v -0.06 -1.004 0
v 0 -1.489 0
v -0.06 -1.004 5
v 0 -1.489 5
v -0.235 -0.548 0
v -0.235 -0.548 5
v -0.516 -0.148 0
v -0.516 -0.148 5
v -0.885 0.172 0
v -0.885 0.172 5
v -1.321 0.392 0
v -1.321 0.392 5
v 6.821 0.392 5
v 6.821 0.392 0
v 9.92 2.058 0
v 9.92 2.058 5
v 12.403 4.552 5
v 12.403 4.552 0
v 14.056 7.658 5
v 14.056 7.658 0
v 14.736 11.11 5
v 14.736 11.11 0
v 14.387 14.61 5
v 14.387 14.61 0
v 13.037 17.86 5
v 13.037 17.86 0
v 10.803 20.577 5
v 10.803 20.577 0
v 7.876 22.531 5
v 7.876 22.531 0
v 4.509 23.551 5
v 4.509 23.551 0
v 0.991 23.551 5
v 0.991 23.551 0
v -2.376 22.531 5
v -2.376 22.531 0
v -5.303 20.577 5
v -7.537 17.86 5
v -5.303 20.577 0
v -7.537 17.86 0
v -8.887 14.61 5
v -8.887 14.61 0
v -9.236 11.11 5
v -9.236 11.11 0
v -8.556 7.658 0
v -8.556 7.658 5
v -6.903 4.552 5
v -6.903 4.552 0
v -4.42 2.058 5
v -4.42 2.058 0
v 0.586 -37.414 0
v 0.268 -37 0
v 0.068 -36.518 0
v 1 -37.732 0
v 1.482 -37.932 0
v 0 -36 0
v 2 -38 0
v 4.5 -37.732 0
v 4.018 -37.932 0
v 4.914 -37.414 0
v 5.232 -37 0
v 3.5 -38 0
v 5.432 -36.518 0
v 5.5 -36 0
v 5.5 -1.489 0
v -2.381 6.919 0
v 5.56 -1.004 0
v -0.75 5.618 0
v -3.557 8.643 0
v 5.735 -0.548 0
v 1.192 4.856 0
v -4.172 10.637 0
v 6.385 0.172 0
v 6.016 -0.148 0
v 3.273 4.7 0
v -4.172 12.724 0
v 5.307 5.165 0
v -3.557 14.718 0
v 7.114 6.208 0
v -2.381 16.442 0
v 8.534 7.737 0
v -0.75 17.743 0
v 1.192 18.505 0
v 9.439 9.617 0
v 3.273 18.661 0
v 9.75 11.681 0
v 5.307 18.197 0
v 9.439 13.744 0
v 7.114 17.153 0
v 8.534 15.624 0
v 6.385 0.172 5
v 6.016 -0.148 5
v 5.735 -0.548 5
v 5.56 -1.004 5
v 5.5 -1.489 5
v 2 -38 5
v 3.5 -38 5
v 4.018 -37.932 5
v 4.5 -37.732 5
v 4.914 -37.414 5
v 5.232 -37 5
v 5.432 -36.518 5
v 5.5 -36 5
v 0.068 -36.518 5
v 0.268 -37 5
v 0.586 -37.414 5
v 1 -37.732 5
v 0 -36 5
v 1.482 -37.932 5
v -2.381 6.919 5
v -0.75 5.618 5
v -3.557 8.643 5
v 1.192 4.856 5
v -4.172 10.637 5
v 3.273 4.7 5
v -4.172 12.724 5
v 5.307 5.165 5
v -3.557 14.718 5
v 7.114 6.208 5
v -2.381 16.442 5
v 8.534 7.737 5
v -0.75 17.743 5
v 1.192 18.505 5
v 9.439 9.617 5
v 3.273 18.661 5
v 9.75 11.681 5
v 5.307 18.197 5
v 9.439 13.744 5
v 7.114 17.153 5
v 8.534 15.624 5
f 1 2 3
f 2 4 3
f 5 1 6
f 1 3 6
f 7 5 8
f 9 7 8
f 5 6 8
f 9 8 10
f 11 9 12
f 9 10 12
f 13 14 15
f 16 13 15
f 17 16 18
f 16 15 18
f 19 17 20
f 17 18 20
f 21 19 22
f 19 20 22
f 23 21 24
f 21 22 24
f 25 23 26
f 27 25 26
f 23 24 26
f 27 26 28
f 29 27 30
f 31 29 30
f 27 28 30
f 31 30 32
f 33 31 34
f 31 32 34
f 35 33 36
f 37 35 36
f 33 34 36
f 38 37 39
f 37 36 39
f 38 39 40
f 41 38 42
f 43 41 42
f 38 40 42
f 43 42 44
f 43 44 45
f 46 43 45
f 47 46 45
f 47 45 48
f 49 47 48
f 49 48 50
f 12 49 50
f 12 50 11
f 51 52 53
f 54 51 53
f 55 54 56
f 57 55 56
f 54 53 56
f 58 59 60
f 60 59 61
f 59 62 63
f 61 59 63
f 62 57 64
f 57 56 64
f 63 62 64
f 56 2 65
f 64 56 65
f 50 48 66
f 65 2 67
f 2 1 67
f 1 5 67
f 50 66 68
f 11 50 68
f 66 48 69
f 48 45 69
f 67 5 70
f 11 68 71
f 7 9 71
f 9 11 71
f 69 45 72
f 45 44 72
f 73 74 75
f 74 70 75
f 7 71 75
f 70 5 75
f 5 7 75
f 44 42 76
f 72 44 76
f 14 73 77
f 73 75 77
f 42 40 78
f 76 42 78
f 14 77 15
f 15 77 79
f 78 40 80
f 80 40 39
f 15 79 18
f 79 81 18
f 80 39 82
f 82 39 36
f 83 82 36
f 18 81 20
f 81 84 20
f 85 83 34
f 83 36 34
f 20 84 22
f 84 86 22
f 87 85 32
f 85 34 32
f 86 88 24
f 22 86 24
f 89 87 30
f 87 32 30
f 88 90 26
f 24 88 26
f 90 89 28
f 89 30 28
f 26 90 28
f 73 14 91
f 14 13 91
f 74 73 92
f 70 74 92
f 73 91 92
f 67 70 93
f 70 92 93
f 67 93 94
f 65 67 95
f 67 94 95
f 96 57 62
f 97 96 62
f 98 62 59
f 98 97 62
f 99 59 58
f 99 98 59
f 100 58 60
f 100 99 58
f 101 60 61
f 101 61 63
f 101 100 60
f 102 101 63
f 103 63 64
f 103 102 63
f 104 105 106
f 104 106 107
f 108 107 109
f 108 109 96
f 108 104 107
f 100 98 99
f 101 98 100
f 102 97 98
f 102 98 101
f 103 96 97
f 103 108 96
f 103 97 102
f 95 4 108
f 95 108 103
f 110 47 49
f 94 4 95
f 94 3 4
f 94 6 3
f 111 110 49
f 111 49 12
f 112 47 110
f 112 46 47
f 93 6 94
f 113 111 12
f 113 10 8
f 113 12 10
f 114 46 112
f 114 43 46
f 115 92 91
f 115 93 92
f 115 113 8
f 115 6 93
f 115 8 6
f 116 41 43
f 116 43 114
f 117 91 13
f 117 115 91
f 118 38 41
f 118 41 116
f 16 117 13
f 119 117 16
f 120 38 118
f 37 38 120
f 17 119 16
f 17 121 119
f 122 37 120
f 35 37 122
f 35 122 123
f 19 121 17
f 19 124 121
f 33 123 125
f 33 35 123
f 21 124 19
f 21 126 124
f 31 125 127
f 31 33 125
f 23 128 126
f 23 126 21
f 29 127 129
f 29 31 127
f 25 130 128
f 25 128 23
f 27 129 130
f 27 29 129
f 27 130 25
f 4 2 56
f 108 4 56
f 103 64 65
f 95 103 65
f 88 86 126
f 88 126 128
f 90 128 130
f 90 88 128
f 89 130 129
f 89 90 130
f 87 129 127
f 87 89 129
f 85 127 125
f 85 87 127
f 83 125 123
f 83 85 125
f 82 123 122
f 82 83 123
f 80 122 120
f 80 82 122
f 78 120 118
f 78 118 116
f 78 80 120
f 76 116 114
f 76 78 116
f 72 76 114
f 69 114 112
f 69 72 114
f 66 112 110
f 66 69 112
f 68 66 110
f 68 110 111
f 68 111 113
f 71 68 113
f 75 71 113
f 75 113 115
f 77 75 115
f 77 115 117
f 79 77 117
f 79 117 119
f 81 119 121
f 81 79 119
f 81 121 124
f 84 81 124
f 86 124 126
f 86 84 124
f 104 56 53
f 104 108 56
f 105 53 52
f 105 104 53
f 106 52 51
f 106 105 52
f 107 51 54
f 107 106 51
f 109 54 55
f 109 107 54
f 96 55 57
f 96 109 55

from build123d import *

# Parameters (mm, degrees)
SKETCH1_R           = 7
BOSS_EXTRUDE1_DEPTH = 5
FILLET1_R           = 2


with BuildPart() as part:
    # Sketch1 → Boss-Extrude1 (new body)
    with BuildSketch(Plane.XY):
        with BuildLine():
            Line((0, 0), (0, -38))
            Line((0, -38), (5.5, -38))
            Line((5.5, -38), (5.5, 0))
            ThreePointArc((5.5, 0), (2.75, 23.680646386), (0, 0))
        make_face()
        with Locations((2.75, 11.680646386)):
            Circle(SKETCH1_R, mode=Mode.SUBTRACT)
    extrude(amount=BOSS_EXTRUDE1_DEPTH)

    # Fillet1
    fillet1_edges = [part.edges().sort_by_distance(p)[0] for p in [
        (5.5, 0, 2.5),
        (5.5, -38, 2.5),
        (0, -38, 2.5),
        (0, 0, 2.5),
    ]]
    fillet(fillet1_edges, radius=FILLET1_R)


solid = part.part
